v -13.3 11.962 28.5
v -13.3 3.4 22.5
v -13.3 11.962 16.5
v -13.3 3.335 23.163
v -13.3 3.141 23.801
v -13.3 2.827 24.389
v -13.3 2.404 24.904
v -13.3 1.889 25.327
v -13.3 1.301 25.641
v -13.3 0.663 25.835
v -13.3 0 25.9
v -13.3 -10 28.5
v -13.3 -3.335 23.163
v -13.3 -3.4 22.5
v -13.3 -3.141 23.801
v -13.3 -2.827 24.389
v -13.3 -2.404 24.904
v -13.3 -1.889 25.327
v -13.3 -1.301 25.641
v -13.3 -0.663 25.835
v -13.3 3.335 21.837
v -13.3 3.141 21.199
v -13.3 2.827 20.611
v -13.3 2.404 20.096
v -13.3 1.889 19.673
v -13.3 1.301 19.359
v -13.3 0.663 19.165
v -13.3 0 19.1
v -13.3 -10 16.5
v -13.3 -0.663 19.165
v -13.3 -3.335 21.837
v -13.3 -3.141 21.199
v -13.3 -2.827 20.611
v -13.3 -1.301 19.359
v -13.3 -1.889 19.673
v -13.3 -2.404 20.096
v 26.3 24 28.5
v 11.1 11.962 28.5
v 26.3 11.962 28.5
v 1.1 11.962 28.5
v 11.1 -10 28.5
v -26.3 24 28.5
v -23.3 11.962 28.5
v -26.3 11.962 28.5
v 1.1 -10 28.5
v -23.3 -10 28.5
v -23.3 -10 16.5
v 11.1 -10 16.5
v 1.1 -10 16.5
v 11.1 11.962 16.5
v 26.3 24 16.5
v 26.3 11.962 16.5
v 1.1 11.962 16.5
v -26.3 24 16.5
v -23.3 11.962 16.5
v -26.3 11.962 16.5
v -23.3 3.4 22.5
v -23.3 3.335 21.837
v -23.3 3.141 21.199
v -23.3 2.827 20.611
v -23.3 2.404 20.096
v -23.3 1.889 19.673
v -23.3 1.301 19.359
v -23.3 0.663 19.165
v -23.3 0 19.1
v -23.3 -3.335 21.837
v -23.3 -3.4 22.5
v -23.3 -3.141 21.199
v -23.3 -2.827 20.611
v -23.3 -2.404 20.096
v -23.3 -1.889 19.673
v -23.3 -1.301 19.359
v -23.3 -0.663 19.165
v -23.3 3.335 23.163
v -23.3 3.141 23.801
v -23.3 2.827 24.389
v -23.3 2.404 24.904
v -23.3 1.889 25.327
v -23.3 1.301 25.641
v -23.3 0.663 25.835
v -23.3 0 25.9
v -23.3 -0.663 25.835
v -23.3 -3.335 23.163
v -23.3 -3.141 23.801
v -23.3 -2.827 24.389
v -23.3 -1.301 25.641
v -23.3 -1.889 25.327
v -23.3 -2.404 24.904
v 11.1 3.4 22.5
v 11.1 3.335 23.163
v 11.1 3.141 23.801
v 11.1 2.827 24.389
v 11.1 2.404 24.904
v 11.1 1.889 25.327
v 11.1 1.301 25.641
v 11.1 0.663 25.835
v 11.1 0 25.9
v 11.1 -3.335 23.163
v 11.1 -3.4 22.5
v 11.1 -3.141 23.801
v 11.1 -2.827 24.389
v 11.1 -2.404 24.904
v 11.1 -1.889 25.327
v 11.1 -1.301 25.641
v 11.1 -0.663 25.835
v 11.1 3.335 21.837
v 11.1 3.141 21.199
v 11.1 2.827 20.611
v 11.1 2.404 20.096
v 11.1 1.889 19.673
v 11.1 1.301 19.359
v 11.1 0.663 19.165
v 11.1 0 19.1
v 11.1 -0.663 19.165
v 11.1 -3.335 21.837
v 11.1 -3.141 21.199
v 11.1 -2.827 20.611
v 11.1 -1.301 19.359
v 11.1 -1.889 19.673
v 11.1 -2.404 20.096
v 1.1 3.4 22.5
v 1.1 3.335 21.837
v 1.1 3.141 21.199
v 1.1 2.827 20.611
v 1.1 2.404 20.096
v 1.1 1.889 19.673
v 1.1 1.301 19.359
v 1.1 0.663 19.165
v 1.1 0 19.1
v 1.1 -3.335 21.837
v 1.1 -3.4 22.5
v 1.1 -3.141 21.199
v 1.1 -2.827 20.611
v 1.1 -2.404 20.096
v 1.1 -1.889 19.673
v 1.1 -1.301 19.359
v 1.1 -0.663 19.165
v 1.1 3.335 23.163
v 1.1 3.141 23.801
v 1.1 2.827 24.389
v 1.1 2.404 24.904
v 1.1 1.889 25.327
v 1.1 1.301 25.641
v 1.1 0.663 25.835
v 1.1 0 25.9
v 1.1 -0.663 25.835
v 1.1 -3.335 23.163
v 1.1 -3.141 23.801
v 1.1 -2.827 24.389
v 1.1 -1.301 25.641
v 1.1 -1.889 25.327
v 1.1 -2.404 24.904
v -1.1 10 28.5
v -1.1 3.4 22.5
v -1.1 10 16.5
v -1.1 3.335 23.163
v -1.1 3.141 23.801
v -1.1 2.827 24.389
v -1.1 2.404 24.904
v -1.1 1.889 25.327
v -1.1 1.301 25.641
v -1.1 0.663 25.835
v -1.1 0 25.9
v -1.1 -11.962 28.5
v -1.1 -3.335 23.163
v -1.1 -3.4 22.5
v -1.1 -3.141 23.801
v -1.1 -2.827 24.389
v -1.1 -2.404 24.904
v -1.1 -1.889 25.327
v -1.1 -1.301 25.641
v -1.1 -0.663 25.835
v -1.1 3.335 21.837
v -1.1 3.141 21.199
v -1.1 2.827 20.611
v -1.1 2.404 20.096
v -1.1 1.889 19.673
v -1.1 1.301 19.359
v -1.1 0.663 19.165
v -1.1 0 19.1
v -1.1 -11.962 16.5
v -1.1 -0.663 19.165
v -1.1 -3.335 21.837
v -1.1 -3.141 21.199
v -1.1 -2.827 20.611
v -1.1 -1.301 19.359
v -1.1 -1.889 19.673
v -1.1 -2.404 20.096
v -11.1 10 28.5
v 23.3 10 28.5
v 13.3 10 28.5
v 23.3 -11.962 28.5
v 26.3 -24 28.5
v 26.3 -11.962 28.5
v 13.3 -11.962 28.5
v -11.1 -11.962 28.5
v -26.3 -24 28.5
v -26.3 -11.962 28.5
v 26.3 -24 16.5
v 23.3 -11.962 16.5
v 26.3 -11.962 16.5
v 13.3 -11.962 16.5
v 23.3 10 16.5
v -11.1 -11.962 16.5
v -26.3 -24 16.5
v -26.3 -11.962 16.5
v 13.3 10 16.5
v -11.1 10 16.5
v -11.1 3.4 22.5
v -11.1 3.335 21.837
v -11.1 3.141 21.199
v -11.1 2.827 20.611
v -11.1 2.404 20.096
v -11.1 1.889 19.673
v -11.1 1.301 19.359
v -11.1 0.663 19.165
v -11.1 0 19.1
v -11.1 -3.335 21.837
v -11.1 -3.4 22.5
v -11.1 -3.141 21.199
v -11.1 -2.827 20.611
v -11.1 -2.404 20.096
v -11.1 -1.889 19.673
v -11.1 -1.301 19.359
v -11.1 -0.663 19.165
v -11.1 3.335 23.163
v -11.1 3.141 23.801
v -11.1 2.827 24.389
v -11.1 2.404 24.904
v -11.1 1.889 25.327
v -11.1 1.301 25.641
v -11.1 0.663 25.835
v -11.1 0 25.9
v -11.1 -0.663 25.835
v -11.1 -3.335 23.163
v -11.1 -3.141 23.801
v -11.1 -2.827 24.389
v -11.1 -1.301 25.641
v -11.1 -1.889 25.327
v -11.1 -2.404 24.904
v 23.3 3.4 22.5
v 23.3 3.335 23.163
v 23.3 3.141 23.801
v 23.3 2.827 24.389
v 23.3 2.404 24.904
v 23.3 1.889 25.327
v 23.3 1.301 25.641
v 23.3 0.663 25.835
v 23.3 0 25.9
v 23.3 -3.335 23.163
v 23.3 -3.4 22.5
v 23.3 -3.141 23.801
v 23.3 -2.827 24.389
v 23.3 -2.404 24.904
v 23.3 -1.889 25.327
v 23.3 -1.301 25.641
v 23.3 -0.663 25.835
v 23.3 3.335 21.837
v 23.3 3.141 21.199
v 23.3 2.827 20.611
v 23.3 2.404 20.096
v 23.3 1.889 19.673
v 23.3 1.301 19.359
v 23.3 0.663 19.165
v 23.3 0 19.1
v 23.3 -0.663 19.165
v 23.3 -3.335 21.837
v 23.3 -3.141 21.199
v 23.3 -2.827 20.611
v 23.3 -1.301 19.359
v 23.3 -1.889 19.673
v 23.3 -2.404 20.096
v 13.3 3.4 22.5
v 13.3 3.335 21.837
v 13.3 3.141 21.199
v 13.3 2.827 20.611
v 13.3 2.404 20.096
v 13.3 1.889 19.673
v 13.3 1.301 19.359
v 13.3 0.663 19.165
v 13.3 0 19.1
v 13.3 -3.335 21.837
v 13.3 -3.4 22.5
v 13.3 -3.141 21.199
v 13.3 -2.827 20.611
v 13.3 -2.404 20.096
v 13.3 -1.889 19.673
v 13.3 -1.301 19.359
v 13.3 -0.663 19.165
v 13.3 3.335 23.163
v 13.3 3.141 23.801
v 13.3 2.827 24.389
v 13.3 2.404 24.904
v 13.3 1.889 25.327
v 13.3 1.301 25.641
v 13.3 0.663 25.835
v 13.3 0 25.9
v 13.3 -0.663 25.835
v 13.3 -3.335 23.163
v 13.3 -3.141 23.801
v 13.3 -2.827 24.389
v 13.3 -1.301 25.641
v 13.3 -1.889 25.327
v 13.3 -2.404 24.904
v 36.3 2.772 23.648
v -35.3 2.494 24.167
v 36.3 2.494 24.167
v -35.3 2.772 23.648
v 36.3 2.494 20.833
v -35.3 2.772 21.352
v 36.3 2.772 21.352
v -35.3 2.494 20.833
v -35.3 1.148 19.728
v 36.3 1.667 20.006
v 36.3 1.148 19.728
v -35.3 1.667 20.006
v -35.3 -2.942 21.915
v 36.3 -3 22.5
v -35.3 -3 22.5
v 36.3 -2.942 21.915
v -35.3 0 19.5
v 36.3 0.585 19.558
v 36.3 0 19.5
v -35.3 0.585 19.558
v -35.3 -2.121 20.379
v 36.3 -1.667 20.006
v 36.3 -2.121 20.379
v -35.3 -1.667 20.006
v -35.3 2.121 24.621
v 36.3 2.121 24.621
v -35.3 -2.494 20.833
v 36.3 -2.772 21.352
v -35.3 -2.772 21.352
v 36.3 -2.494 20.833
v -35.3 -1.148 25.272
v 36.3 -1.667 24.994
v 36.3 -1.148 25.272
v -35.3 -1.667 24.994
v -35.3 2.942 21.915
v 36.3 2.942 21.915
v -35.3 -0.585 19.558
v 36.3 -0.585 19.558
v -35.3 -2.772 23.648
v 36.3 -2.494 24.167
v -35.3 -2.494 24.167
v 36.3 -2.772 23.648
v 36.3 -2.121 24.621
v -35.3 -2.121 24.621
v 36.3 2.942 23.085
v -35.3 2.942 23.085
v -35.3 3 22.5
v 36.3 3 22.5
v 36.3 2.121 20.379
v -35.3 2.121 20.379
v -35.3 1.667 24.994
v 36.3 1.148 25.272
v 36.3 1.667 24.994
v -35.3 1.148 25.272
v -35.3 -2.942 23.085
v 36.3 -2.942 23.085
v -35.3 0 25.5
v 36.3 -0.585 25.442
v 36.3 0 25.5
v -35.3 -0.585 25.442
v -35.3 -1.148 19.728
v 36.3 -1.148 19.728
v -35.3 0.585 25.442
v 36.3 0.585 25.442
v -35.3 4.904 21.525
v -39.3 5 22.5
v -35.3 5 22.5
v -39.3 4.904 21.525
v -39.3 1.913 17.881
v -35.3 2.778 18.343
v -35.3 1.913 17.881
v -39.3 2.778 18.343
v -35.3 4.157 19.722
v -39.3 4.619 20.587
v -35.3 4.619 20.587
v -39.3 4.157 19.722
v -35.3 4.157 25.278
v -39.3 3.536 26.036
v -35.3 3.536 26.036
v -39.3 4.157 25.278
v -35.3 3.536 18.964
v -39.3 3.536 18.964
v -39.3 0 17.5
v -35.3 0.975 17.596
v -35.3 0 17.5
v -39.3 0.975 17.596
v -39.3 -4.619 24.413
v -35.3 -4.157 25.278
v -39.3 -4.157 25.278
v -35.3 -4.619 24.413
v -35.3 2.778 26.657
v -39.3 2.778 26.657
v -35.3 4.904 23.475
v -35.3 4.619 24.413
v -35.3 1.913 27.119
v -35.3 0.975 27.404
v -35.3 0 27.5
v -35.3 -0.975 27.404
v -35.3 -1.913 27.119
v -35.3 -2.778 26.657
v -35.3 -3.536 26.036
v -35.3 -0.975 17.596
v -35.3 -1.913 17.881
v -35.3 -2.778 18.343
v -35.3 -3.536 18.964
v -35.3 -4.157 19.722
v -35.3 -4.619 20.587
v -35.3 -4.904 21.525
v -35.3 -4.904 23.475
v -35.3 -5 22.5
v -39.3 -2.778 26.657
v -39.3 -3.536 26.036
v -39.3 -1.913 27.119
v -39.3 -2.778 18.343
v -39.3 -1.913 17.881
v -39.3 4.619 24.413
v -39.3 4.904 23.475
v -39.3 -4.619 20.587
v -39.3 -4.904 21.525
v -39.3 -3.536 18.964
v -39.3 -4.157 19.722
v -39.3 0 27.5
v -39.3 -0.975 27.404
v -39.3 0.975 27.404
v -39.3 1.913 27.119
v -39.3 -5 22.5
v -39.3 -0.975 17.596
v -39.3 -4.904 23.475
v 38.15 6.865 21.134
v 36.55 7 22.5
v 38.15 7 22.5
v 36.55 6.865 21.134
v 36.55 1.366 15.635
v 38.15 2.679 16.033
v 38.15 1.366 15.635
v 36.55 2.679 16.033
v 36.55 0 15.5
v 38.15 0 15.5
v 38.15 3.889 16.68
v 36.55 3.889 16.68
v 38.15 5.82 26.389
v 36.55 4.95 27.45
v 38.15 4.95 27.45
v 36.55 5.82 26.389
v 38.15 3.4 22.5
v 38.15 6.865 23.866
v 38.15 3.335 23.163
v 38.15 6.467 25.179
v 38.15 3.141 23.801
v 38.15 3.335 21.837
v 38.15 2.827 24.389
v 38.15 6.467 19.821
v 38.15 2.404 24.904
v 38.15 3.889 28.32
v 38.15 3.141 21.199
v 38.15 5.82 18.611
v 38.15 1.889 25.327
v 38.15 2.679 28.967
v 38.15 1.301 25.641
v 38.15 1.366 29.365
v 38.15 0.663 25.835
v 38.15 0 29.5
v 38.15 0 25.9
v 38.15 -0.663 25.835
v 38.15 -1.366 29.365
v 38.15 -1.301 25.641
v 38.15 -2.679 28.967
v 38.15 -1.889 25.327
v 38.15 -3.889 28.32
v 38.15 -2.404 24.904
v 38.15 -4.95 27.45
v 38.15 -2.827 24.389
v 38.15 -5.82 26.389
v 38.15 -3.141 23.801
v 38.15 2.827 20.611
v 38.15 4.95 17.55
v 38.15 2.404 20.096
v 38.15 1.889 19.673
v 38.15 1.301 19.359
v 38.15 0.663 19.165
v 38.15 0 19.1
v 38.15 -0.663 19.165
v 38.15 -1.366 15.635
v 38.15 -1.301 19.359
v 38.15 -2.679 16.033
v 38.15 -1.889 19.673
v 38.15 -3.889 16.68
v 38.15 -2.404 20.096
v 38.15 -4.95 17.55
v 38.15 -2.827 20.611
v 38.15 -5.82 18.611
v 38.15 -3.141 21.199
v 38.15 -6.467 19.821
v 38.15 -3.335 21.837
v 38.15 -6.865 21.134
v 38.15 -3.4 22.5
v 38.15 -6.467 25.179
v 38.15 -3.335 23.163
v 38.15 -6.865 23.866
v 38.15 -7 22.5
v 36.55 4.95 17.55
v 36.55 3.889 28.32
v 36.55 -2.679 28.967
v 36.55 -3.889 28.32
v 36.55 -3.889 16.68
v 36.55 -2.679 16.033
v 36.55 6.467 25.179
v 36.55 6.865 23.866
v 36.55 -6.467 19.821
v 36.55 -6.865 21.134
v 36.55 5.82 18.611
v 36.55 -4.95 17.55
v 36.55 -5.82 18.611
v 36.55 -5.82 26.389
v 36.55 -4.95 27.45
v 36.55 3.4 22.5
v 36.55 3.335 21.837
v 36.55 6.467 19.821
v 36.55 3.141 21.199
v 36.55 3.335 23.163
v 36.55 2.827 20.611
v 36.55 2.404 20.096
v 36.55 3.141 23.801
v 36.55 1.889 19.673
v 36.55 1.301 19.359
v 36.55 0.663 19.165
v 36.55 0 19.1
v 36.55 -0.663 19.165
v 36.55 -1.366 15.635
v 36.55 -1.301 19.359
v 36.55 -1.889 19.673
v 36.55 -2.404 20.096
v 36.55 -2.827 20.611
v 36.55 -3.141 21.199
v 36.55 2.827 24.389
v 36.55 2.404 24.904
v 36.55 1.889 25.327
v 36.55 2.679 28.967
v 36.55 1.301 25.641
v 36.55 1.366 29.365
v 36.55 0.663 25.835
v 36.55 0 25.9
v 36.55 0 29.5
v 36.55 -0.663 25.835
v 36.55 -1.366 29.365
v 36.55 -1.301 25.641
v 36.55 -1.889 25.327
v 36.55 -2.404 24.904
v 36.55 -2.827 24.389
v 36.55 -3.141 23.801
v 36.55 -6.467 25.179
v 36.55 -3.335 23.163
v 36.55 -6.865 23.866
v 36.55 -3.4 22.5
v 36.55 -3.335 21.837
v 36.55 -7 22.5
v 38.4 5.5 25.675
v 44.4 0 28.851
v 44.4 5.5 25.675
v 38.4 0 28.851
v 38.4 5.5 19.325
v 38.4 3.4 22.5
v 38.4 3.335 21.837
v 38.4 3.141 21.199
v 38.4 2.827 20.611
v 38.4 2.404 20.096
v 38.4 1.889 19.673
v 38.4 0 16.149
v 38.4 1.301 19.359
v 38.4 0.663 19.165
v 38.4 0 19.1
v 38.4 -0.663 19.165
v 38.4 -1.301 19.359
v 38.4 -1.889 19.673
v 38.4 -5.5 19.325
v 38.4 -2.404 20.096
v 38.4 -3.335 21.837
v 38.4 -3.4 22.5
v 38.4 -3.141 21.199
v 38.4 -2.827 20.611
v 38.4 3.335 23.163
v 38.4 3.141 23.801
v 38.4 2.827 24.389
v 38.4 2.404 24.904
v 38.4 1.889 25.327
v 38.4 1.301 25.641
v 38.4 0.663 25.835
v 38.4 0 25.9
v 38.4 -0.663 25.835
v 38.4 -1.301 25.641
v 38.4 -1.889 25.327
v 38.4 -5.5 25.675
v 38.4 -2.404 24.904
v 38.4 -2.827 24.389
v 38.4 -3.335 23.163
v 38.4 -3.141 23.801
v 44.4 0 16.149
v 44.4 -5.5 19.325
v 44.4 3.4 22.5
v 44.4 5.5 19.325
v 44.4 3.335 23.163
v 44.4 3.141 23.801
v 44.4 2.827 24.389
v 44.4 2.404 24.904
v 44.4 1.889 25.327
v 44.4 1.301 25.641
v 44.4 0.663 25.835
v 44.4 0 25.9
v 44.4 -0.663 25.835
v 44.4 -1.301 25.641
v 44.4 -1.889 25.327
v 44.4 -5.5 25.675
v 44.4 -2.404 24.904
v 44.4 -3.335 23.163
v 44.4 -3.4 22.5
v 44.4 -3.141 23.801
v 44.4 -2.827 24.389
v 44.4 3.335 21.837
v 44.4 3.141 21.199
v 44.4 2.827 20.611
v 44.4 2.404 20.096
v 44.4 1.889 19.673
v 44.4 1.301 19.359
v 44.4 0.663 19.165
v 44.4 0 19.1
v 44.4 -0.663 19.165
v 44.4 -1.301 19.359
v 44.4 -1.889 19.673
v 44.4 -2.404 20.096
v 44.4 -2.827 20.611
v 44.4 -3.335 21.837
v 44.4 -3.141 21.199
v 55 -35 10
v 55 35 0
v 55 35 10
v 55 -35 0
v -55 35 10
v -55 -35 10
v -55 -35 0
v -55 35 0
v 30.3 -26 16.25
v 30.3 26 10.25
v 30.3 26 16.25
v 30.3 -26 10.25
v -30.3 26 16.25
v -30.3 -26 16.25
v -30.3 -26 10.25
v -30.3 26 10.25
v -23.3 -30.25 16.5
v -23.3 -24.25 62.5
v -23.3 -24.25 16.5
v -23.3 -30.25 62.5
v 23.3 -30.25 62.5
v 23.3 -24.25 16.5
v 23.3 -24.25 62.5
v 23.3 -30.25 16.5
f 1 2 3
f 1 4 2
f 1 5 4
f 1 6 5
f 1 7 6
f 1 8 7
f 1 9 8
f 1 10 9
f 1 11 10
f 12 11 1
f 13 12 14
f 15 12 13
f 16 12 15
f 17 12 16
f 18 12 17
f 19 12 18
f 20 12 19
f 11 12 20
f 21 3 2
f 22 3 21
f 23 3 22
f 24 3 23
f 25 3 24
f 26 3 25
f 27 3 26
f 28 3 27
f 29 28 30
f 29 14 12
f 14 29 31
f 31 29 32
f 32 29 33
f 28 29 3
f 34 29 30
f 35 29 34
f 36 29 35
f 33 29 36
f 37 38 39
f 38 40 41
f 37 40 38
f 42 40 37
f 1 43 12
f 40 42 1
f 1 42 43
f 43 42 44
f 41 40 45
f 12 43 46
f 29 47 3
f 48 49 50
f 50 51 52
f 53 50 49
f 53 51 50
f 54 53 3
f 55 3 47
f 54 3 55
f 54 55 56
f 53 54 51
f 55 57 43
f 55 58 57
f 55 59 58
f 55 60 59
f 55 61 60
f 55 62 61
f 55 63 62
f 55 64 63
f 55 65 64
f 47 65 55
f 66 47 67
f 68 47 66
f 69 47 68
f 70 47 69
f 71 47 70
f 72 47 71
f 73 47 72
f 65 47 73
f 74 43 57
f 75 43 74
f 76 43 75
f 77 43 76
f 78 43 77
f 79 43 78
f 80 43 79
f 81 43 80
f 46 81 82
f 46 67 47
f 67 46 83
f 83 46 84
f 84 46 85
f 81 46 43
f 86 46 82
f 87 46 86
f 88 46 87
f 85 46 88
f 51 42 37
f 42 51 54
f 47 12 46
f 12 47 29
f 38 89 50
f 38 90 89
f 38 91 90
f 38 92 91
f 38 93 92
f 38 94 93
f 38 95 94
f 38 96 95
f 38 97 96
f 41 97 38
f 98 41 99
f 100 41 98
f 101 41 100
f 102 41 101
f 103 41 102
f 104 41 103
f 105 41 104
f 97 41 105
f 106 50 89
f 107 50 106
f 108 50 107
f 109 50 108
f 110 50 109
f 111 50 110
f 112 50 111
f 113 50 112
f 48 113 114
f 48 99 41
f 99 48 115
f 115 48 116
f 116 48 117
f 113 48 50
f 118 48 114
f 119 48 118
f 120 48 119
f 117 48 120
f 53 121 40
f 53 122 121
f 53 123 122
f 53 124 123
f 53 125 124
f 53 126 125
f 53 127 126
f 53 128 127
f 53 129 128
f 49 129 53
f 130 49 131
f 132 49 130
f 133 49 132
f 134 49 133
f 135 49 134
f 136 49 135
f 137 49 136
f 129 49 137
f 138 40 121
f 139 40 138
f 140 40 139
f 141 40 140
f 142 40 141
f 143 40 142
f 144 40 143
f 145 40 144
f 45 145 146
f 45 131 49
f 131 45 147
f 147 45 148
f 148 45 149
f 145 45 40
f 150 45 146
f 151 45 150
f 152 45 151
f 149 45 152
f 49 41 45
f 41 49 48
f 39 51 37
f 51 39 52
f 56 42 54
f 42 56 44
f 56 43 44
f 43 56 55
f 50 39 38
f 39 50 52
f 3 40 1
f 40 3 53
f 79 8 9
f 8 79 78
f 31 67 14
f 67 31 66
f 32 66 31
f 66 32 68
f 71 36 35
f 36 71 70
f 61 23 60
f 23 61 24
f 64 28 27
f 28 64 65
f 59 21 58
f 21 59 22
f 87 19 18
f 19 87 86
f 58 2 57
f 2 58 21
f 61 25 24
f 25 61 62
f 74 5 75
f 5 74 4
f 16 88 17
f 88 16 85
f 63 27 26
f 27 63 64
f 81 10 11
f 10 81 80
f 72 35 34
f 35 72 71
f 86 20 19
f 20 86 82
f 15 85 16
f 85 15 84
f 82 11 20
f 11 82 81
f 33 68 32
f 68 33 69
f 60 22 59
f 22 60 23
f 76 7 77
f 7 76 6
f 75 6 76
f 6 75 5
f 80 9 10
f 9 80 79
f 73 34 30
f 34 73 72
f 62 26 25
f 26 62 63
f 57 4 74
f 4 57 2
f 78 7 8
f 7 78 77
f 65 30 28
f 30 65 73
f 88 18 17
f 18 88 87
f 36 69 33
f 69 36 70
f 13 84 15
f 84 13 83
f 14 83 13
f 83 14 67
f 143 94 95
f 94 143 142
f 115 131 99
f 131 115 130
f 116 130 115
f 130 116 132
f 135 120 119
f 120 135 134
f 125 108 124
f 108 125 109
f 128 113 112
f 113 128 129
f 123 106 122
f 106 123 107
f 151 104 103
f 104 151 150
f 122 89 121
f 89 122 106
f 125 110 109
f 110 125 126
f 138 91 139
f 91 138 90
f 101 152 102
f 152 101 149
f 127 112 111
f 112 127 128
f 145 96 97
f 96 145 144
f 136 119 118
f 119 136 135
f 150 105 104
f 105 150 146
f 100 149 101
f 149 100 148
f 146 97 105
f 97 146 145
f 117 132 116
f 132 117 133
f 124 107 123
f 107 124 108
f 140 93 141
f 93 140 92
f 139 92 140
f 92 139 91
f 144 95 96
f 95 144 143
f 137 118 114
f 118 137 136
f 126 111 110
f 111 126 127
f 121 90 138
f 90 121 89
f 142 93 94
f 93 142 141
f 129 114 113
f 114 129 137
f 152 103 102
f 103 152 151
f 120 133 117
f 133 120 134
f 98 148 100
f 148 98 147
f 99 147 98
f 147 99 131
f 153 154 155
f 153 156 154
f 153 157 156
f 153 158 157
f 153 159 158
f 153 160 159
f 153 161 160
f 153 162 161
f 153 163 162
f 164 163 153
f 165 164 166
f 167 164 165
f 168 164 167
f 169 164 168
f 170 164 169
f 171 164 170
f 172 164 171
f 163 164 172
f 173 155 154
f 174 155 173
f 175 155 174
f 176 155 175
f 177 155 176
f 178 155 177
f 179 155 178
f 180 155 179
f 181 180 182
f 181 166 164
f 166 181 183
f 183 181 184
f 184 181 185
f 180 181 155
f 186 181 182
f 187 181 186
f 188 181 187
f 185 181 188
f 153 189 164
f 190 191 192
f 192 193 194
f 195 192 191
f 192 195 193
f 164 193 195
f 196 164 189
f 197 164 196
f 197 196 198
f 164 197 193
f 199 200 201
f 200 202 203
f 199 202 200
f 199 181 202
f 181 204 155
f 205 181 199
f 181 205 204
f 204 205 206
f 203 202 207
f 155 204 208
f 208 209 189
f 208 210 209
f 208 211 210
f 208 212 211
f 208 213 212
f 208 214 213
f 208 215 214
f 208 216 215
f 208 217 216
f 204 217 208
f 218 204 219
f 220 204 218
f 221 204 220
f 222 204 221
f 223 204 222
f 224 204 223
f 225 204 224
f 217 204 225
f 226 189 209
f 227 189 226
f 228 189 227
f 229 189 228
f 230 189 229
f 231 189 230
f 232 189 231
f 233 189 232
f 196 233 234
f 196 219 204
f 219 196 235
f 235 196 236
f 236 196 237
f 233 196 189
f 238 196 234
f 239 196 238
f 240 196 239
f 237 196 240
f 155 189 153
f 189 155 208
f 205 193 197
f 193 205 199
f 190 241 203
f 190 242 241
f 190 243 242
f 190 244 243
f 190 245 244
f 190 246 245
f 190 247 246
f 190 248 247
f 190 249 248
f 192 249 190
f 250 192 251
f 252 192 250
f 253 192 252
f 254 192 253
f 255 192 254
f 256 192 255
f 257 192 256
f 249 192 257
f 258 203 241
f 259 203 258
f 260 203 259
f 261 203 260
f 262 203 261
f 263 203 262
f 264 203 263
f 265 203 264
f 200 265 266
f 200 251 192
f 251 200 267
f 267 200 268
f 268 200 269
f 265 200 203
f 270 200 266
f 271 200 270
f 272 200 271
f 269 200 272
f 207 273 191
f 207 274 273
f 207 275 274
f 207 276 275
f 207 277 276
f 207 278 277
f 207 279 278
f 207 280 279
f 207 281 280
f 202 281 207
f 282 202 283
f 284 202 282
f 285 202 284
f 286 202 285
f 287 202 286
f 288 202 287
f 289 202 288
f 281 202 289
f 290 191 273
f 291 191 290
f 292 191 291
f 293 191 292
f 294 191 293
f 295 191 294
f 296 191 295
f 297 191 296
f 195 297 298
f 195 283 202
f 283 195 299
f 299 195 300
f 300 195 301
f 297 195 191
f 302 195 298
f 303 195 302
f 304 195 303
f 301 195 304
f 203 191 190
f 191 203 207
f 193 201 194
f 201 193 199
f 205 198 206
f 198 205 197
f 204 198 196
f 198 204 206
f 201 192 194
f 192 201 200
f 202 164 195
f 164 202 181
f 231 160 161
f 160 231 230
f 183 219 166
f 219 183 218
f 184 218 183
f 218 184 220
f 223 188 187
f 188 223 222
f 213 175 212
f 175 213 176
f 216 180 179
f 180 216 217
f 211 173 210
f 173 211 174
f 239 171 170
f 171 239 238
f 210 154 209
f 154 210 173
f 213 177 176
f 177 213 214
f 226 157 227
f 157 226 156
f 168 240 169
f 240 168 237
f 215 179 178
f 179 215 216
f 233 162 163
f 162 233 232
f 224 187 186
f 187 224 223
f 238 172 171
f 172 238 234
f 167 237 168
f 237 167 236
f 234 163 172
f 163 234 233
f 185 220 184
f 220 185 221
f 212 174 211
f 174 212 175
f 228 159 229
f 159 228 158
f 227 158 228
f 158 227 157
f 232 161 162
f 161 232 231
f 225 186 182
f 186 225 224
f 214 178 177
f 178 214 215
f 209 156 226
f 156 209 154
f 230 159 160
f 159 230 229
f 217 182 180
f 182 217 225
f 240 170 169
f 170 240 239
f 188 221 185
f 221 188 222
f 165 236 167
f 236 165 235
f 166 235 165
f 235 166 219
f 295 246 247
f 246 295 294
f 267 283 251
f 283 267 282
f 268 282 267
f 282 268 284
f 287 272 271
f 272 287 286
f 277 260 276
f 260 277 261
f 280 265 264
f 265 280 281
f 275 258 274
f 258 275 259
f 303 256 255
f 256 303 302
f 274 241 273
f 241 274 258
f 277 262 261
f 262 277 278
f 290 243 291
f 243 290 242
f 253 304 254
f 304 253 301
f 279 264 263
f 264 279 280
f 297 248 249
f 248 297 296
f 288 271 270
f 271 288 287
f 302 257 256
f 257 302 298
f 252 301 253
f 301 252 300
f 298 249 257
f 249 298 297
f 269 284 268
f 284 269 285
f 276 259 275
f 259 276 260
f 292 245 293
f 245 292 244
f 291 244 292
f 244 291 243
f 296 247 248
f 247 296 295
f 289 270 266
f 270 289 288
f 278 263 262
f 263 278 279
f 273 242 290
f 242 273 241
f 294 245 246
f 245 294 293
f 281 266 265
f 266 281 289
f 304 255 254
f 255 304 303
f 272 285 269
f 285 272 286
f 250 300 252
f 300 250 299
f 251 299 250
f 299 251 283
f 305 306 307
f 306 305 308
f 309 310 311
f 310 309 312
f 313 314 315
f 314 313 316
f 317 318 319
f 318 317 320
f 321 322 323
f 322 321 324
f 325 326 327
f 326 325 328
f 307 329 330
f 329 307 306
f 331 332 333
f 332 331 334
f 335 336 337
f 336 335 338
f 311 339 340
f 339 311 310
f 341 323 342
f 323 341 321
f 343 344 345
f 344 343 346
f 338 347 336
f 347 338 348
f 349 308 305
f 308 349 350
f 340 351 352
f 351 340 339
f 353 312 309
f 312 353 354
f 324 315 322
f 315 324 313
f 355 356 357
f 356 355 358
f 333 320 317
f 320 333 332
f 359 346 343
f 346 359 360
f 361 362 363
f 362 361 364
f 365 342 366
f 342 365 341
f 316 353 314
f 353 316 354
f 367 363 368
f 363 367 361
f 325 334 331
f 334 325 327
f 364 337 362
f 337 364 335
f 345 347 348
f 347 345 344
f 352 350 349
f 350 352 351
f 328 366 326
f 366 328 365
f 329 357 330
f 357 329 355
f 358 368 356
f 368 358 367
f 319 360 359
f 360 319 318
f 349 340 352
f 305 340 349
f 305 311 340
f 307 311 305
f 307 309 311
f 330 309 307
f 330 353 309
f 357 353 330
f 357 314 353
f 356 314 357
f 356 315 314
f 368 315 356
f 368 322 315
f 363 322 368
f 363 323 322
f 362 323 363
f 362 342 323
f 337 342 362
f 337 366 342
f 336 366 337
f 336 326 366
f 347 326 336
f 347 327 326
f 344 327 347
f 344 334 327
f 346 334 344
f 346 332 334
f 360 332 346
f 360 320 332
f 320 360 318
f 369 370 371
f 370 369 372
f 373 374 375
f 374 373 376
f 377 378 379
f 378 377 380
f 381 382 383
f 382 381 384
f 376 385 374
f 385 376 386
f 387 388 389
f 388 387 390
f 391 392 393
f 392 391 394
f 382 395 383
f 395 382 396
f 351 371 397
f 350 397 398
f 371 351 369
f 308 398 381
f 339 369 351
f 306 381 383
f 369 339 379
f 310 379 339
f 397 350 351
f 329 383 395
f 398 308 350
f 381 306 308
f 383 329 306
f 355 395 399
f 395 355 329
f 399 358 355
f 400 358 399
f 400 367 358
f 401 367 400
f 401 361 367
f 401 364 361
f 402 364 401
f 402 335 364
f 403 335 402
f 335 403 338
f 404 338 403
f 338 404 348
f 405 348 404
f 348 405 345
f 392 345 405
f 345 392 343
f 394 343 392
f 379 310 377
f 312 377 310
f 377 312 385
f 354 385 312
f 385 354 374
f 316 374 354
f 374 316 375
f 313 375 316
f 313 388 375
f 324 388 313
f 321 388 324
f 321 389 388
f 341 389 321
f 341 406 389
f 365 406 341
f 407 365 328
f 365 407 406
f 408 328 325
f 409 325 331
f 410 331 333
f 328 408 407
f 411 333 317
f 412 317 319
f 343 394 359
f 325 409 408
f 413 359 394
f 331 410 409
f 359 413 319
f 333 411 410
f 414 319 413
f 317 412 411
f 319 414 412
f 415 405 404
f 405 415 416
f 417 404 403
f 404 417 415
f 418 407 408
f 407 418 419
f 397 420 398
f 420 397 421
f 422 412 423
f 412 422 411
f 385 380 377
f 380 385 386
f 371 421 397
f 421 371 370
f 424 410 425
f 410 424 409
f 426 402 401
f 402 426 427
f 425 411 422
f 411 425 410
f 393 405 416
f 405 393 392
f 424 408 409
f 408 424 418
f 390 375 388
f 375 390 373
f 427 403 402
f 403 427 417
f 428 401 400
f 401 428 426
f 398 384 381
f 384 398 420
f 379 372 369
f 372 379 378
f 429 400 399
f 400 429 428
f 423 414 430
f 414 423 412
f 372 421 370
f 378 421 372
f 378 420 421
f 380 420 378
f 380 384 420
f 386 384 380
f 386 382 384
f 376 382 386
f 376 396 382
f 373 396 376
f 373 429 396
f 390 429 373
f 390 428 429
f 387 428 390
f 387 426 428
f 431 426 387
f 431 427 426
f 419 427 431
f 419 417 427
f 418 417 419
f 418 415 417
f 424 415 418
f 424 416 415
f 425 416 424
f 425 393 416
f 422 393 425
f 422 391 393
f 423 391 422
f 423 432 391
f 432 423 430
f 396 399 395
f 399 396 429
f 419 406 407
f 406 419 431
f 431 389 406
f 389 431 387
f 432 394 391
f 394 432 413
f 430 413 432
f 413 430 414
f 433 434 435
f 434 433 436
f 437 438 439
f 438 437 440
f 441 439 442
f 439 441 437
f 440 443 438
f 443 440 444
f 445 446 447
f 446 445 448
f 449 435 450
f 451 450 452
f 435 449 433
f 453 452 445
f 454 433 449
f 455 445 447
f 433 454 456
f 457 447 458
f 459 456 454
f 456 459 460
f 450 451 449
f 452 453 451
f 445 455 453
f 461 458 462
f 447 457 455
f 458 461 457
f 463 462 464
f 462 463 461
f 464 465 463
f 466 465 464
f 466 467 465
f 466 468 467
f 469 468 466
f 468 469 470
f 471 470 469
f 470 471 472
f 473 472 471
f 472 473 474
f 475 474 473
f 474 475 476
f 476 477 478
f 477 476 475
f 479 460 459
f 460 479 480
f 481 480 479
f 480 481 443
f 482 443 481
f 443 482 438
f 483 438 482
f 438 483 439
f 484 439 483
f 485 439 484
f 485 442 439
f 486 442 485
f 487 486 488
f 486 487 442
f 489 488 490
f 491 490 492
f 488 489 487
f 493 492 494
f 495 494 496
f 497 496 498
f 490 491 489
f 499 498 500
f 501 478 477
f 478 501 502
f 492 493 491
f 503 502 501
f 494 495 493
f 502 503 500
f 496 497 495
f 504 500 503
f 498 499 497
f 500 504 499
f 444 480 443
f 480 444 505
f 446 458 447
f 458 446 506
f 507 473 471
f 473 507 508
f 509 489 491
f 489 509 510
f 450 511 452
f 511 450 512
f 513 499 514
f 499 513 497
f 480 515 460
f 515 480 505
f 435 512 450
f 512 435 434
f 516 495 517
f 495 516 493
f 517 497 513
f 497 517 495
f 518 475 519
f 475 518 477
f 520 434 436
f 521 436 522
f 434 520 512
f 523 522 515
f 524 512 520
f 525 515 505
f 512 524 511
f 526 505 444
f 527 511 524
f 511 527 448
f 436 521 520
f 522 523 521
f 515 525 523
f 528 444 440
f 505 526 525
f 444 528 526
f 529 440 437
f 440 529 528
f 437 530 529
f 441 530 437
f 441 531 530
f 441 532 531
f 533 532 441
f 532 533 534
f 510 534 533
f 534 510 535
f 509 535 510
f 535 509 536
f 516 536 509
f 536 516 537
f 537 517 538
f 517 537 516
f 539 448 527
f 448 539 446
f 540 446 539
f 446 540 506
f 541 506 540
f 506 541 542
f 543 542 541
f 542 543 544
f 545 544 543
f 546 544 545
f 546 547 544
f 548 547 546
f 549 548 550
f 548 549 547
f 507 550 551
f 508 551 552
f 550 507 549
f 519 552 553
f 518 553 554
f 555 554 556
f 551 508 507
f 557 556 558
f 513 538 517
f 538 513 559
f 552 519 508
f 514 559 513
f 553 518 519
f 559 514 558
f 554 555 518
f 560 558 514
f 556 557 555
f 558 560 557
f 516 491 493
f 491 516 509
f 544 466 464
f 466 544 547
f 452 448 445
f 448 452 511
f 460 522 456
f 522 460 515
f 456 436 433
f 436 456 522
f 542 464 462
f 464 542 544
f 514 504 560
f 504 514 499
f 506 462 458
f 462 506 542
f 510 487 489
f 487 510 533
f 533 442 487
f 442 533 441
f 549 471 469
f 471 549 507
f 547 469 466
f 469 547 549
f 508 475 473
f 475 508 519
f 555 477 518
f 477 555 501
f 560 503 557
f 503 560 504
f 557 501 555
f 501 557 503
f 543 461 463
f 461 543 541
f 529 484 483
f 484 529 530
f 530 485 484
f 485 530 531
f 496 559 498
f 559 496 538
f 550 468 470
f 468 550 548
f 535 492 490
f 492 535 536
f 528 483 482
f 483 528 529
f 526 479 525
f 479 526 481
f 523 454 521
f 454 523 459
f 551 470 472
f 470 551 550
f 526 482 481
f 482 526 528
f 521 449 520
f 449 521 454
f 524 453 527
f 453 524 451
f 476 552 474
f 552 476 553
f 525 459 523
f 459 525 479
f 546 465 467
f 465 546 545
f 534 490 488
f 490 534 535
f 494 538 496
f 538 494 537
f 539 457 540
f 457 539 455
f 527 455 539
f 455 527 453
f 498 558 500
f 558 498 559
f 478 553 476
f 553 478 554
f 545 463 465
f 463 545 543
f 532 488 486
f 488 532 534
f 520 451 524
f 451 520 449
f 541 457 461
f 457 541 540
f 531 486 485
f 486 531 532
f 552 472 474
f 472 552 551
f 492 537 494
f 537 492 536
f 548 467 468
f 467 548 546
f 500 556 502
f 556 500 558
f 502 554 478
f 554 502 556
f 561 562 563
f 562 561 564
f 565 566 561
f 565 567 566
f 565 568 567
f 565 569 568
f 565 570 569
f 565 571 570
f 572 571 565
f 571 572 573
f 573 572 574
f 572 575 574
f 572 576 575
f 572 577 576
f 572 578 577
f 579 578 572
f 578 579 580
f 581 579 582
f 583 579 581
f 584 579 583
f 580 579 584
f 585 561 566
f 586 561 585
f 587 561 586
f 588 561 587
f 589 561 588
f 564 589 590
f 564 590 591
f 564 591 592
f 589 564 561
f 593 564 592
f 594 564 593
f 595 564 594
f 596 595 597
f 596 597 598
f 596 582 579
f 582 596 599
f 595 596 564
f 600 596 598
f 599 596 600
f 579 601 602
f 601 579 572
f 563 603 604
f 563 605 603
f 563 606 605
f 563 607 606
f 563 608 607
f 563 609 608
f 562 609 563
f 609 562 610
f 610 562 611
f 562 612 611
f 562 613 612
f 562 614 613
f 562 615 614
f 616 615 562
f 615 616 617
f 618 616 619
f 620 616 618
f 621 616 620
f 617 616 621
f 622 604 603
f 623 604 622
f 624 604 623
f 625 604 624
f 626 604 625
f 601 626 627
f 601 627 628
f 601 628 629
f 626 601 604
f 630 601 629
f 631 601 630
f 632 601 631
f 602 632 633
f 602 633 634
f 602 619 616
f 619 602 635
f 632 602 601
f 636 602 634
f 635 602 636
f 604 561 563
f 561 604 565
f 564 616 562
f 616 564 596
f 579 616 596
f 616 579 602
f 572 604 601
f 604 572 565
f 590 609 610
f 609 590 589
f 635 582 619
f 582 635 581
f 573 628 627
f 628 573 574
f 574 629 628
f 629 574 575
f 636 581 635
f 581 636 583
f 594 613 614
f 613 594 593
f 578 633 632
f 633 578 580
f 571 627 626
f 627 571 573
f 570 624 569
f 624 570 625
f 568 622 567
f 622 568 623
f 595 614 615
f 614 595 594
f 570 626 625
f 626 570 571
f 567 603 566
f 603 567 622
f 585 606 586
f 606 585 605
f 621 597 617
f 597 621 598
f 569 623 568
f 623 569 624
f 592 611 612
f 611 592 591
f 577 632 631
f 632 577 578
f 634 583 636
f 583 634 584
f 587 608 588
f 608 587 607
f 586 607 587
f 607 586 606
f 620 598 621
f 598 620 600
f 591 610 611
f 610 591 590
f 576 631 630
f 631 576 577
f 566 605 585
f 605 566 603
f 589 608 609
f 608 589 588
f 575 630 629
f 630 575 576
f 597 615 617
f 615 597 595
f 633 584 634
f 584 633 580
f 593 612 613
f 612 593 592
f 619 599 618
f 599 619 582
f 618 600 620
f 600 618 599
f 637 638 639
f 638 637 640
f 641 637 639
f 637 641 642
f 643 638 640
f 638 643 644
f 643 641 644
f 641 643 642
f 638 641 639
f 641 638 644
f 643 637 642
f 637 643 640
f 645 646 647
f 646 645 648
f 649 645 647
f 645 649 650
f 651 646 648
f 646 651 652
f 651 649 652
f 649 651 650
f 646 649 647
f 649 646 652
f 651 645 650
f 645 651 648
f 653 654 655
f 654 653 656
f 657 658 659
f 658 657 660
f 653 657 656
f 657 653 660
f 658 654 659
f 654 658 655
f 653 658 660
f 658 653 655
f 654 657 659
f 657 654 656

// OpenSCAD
$fn = 32;

// ------------------------------------------------------------------------
// Comb hinge with flap: leaf 52.6 x 24 mm, pin d6, flap 46 mm
// Every part is its own module, assembly() places every instance.
// ------------------------------------------------------------------------

// --- part 1 ---
module hinge_bed() {
  difference() {
    translate([-55, -35, 0]) cube([110, 70, 10]);
  }
}

// --- part 2 ---
module hinge_riser() {
  difference() {
    translate([-30.3, -26, 0]) cube([60.6, 52, 6]);
  }
}

// --- part 3 ---
module hinge_leaf_a() {
  difference() {
    union() {
      translate([-23.3, -10, -6]) cube([10, 34, 12]);
      translate([1.1, -10, -6]) cube([10, 34, 12]);
      translate([-26.3, 11.962, -6]) cube([52.6, 12.038, 12]);
    }
    translate([-18.3, 0, 0]) rotate([0, 90, 0]) cylinder(h = 12, d = 6.8, center = true);
    translate([6.1, 0, 0]) rotate([0, 90, 0]) cylinder(h = 12, d = 6.8, center = true);
  }
}

// --- part 4 ---
module hinge_leaf_b() {
  difference() {
    union() {
      translate([-11.1, -24, -6]) cube([10, 34, 12]);
      translate([13.3, -24, -6]) cube([10, 34, 12]);
      translate([-26.3, -24, -6]) cube([52.6, 12.038, 12]);
    }
    translate([-6.1, 0, 0]) rotate([0, 90, 0]) cylinder(h = 12, d = 6.8, center = true);
    translate([18.3, 0, 0]) rotate([0, 90, 0]) cylinder(h = 12, d = 6.8, center = true);
  }
}

// --- part 5 ---
module hinge_flap() {
  difference() {
    translate([-23.3, -23, 0]) cube([46.6, 46, 6]);
  }
}

// --- part 6 ---
module hinge_pin() {
  rotate([0, 90, 0]) cylinder(h = 72.6, d = 6, center = true);
  translate([-39.3, 0, 0]) rotate([0, 90, 0]) cylinder(h = 4, d = 10);
}

// --- part 7 ---
module pin_washer() {
  difference() {
      translate([0, 0, 0]) cylinder(h = 1.6, d = 14);
      translate([0, 0, -1]) cylinder(h = 3.6, d = 6.8);
    }
}

// --- part 8 ---
module pin_nut() {
  difference() {
    linear_extrude(height = 6) polygon(points = [[6.351, 0], [3.175, 5.5], [-3.175, 5.5], [-6.351, 0], [-3.175, -5.5], [3.175, -5.5]]);
    translate([0, 0, -1]) cylinder(h = 8, d = 6.8);
  }
}

// --- assembly ---
module assembly() {
  color([0.80, 0.24, 0.20]) translate([0, 0, 0]) rotate([0, 0, 0]) hinge_bed();
  color([0.20, 0.45, 0.75]) translate([0, 0, 10.25]) rotate([0, 0, 0]) hinge_riser();
  color([0.25, 0.62, 0.32]) translate([0, 0, 22.5]) rotate([0, 0, 0]) hinge_leaf_a();
  color([0.92, 0.70, 0.18]) translate([0, 0, 22.5]) rotate([0, 0, 0]) hinge_leaf_b();
  color([0.58, 0.35, 0.70]) translate([0, -24.25, 39.5]) rotate([90, 0, 0]) hinge_flap();
  color([0.16, 0.66, 0.66]) translate([0, 0, 22.5]) rotate([0, 0, 0]) hinge_pin();
  color([0.85, 0.48, 0.18]) translate([36.55, 0, 22.5]) rotate([0, 90, 0]) pin_washer();
  color([0.55, 0.60, 0.65]) translate([38.4, 0, 22.5]) rotate([0, 90, 0]) pin_nut();
}

assembly();
